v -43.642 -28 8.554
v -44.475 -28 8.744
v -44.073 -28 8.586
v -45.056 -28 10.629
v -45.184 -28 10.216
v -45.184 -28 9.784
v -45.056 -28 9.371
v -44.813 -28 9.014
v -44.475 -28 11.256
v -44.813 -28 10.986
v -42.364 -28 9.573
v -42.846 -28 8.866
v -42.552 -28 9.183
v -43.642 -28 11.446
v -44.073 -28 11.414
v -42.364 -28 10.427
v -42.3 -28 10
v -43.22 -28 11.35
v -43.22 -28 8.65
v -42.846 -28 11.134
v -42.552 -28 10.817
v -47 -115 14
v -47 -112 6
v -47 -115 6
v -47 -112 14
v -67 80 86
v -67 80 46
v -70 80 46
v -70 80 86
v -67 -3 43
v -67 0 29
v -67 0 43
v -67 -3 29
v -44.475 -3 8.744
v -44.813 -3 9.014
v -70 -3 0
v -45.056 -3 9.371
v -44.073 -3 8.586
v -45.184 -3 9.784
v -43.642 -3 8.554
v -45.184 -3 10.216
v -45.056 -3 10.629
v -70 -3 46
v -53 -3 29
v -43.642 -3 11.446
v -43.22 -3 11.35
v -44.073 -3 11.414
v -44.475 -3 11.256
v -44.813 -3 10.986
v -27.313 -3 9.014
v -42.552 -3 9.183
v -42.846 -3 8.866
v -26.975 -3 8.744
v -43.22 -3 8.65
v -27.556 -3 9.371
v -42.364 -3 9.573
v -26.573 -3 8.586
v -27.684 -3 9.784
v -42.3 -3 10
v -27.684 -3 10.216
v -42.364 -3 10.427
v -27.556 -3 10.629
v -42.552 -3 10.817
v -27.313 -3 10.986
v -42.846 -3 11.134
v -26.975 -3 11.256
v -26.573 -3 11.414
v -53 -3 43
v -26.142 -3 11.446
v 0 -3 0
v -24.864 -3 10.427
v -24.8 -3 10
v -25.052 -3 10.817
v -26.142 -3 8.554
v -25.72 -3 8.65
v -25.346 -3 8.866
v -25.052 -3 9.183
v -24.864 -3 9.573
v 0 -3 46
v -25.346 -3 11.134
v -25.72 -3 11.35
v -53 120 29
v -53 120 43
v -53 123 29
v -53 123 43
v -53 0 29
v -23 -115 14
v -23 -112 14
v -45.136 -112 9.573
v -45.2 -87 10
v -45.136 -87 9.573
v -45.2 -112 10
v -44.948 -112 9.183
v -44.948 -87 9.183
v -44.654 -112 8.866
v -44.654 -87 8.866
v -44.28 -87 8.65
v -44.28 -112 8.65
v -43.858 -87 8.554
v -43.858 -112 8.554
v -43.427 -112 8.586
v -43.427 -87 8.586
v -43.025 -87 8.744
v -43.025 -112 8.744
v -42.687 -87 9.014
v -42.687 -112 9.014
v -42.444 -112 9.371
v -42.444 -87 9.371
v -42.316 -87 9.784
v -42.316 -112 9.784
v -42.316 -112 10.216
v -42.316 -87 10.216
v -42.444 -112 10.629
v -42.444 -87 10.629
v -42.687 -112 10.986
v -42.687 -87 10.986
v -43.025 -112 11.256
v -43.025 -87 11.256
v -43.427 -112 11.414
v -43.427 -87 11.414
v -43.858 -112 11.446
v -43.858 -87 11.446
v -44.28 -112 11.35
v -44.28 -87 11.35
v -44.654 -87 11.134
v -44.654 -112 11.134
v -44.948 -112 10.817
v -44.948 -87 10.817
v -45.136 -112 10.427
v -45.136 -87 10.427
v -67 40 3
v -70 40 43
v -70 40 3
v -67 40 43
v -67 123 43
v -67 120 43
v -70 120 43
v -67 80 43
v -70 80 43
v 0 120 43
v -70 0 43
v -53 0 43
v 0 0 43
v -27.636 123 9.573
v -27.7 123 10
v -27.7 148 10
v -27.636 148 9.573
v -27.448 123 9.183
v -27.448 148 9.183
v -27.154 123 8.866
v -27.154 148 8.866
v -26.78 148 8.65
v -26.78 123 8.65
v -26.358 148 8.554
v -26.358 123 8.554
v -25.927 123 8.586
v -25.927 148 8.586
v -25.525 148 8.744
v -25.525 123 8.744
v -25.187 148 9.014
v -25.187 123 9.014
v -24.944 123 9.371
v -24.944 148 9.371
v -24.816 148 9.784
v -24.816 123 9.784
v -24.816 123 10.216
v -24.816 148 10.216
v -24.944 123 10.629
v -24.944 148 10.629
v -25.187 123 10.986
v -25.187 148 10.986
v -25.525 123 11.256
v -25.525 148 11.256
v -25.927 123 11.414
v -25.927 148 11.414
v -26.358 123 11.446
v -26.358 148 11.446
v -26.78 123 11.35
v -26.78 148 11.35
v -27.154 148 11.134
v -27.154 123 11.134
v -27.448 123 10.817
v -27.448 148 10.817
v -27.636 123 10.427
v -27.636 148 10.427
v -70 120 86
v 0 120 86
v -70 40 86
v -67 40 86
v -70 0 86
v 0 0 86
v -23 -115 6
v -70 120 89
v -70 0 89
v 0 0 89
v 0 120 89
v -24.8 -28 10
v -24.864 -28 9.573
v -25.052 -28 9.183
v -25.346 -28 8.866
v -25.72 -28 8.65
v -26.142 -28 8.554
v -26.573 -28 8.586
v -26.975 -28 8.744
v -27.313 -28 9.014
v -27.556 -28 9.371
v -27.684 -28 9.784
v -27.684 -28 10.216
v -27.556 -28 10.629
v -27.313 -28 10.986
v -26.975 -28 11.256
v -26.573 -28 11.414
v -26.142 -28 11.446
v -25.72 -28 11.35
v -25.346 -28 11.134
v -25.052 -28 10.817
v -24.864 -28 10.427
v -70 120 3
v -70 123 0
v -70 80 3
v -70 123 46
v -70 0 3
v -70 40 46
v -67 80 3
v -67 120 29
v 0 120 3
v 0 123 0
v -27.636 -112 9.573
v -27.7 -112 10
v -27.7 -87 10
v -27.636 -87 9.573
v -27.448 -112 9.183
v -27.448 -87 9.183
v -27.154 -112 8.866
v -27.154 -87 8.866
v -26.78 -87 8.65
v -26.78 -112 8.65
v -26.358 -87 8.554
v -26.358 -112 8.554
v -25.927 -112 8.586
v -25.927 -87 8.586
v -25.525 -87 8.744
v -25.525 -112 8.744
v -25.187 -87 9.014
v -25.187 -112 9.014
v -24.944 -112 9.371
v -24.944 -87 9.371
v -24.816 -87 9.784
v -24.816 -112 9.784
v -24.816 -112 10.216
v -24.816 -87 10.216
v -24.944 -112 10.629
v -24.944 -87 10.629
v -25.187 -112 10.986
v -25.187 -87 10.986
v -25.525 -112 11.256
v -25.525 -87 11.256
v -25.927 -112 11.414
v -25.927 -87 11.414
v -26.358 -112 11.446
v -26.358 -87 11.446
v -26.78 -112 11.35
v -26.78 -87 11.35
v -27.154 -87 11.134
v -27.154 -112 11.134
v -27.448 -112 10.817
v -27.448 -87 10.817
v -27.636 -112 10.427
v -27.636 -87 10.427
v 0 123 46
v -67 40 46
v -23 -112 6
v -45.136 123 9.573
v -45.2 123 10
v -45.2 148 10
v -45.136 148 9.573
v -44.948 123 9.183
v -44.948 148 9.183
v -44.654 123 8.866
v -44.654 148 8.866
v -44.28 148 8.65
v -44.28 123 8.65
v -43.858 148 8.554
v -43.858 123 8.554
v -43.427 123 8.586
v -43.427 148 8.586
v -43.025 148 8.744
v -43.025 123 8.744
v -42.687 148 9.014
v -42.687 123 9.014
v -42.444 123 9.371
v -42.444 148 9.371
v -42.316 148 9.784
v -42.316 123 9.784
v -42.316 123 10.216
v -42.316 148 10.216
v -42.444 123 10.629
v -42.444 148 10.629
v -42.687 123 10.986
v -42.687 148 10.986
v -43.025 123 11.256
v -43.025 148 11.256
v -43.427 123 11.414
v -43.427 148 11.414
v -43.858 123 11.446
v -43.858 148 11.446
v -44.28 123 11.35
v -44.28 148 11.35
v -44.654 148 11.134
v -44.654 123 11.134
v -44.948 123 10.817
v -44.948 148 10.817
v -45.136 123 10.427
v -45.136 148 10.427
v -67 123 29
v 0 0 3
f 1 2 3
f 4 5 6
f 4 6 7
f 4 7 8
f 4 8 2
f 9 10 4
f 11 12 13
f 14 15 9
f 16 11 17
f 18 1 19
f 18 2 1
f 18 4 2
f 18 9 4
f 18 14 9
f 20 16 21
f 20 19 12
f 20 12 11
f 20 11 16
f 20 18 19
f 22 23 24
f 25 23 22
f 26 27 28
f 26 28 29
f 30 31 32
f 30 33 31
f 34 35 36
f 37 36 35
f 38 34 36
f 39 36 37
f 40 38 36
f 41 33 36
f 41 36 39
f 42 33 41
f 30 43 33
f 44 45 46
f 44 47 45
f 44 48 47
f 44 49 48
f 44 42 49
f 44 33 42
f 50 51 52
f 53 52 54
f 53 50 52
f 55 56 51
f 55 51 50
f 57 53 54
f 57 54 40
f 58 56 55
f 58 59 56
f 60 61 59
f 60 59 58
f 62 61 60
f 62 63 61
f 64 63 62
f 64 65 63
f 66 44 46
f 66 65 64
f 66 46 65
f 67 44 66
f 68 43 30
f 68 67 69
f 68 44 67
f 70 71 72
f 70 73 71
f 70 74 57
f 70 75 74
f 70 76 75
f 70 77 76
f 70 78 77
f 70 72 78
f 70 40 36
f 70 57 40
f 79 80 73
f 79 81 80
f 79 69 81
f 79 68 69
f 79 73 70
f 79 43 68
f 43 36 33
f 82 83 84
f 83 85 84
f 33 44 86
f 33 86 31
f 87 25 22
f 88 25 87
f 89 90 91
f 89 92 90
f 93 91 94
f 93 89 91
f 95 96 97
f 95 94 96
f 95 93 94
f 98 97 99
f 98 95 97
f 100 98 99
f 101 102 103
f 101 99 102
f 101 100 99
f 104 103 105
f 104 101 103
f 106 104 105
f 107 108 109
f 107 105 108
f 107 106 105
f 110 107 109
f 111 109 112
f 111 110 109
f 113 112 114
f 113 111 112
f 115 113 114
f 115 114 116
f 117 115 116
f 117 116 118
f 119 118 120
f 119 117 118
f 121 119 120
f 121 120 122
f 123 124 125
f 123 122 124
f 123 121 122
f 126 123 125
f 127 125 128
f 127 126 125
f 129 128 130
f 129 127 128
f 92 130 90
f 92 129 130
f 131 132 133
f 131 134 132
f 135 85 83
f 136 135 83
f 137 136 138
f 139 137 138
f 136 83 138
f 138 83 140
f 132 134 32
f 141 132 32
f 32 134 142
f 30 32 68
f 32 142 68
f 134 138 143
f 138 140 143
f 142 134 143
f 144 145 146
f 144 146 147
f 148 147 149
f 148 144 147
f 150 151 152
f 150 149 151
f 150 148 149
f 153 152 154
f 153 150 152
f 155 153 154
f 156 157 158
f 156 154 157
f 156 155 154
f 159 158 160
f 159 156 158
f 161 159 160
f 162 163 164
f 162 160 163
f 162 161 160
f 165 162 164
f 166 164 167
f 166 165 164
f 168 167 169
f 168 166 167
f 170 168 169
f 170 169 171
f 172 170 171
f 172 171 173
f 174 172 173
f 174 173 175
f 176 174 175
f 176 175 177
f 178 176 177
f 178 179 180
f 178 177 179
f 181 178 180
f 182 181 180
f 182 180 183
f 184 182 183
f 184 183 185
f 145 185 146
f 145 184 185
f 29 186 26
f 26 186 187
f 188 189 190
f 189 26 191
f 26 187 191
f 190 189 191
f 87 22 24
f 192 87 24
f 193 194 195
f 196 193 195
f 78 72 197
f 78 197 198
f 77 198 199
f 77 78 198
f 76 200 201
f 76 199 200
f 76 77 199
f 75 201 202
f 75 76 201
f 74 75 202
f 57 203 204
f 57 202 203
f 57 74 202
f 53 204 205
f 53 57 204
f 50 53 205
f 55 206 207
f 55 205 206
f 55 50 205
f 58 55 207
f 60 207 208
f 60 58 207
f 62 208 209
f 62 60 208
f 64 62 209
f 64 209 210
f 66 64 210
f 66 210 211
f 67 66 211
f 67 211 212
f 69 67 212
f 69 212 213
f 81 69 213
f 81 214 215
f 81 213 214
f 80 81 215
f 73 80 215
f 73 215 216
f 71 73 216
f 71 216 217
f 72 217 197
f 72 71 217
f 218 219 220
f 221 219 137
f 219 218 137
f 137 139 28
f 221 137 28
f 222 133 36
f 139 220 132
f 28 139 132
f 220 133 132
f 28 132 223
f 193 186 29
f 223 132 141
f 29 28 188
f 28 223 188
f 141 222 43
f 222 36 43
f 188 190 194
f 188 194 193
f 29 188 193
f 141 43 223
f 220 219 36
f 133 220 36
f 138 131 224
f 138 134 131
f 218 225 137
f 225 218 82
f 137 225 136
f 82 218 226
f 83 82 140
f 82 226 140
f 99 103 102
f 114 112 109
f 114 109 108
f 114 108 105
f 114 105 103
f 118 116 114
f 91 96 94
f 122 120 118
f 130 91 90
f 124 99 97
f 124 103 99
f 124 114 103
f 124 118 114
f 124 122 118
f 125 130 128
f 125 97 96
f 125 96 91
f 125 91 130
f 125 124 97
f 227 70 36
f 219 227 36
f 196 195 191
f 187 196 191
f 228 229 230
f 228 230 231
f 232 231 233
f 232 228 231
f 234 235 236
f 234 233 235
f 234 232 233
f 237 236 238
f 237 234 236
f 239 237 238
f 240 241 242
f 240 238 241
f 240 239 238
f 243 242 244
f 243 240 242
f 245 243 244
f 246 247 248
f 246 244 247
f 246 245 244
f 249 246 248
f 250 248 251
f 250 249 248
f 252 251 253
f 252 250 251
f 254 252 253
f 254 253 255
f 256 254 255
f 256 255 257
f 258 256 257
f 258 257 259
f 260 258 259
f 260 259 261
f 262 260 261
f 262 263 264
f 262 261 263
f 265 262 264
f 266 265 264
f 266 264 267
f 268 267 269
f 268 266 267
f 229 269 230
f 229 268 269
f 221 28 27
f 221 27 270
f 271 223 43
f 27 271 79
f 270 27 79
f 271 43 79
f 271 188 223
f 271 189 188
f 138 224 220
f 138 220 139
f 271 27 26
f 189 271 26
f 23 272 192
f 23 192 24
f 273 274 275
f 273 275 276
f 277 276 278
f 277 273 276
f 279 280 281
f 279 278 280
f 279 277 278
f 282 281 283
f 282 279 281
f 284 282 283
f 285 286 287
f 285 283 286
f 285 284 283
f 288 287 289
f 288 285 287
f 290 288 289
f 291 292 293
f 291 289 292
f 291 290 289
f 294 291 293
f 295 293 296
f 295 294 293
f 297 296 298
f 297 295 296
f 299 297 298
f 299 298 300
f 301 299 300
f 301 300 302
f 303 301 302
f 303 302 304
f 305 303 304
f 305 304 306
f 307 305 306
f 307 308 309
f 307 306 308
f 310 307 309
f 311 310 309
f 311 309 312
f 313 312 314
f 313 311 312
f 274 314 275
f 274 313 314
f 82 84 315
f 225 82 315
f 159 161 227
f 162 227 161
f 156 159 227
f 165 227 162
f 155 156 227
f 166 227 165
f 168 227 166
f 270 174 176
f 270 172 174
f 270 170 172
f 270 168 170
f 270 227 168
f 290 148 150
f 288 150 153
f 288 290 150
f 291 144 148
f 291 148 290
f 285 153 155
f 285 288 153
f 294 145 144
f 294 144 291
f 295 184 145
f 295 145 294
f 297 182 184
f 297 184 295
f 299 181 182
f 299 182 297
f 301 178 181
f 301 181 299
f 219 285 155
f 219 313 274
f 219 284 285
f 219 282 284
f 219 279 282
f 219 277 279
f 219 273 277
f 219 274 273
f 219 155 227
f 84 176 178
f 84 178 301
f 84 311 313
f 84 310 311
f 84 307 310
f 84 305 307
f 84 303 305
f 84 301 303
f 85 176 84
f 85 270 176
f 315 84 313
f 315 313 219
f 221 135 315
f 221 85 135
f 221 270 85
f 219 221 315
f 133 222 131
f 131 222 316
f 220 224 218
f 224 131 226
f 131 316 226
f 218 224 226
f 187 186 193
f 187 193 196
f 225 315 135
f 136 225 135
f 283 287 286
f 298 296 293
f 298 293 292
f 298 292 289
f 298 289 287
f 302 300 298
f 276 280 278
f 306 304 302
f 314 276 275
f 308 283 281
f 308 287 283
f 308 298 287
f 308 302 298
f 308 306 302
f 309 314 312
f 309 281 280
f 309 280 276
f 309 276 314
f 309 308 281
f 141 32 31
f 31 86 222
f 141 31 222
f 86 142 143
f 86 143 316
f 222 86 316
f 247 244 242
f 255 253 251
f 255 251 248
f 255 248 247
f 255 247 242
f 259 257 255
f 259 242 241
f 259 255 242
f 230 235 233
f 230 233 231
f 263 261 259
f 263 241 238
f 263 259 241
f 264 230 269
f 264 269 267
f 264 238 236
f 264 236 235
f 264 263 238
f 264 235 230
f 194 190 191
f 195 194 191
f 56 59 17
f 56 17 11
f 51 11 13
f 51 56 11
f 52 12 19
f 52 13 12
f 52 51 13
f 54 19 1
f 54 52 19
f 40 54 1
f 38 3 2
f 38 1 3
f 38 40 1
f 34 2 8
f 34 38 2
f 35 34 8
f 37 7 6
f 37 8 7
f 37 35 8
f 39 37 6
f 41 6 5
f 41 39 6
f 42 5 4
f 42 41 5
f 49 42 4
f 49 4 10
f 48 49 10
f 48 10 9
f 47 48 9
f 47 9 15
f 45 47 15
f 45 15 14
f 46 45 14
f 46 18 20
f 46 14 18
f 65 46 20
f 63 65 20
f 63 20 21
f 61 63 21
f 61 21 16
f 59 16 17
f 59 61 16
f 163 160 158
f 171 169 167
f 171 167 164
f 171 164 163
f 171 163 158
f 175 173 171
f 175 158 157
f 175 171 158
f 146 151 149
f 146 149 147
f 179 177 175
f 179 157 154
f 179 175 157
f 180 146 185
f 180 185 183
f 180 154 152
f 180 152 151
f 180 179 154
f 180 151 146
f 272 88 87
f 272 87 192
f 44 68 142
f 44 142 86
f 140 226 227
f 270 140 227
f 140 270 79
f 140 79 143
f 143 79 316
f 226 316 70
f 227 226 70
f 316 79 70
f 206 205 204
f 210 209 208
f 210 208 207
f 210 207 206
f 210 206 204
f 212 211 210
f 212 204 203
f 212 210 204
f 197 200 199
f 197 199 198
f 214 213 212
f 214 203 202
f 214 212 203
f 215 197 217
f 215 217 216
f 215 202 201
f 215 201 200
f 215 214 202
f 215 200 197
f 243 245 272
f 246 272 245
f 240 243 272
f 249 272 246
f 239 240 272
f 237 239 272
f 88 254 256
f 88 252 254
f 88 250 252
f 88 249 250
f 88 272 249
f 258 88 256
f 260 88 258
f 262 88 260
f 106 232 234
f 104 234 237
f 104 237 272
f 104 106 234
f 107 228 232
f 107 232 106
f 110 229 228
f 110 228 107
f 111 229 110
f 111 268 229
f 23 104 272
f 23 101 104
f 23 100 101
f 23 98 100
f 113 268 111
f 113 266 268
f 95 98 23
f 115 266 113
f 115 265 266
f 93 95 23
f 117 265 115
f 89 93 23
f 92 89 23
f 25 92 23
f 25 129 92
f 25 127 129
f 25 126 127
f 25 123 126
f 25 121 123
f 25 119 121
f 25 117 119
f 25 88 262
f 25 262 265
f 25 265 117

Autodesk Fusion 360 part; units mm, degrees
sketch "Sketch1" plane through (0, 0, 0) normal (0, 1, 0) x (1, 0, 0) in component "Frame"
  line L0 (0, 0) -> (-70, 0)
  line L1 (-70, 0) -> (-70, -89)
  line L2 (-70, -89) -> (0, -89)
  line L3 (0, -89) -> (0, 0)
  dimension "d1" = 70
  dimension "d2" = 89
extrude "Extrude1" add sketch "Sketch1" along normal blind 120 makes body 1 in component "Frame"
sketch "Sketch2" plane through (0, 0, 0) normal (0, -1, 0) x (1, 0, 0) in component "Frame"
  line L0 (0, 0) -> (0, 89)
  line L1 (0, 89) -> (-70, 89)
  line L2 (-70, 89) -> (-70, 0)
  line L3 (-70, 0) -> (0, 0)
  line L4 (0, 0) -> (-70, 0)
  line L5 (-70, 0) -> (-70, 46)
  line L6 (-70, 46) -> (0, 46)
  line L7 (0, 46) -> (0, 0)
  dimension "d5" = 70
  dimension "d6" = 46
extrude "Extrude2" add sketch "Sketch2" along normal blind 3 contours L0 L2 L3 L4 L5 L6 L7 bodies 1 in component "Frame"
sketch "Sketch3" plane through (0, 120, 0) normal (0, 1, 0) x (-1, 0, 0) in component "Frame"
  line L0 (0, 89) -> (0, 0)
  line L1 (0, 0) -> (70, 0)
  line L2 (70, 0) -> (70, 89)
  line L3 (70, 89) -> (0, 89)
  line L4 (0, 0) -> (70, 0)
  line L5 (70, 0) -> (70, 46)
  line L6 (70, 46) -> (0, 46)
  line L7 (0, 46) -> (0, 0)
  dimension "d9" = 70
  dimension "d10" = 46
extrude "Extrude3" add sketch "Sketch3" along normal blind 3 contours L0 L1 L2 L4 L5 L6 L7 bodies 1 in component "Frame"
sketch "Sketch4" plane through (0, 120, 0) normal (0, 1, 0) x (-1, 0, 0) in component "Frame"
  line L0 (0, 46) -> (70, 46)
  line L1 (70, 46) -> (70, 89)
  line L2 (70, 89) -> (0, 89)
  line L3 (0, 89) -> (0, 46)
  line L4 (0, 46) -> (67, 46)
  line L5 (67, 46) -> (67, 86)
  line L6 (67, 86) -> (0, 86)
  line L7 (0, 86) -> (0, 46)
  dimension "d13" = 67
  dimension "d14" = 40
extrude "Extrude4" cut sketch "Sketch4" against normal up to surface (120 mm away) contours L0 L3 L4 L5 L6 L7 bodies 1 in component "Frame"
sketch "Sketch5" plane through (0, 0, 0) normal (1, 0, 0) x (0, 1, 0) in component "Frame"
  line L0 (123, 46) -> (-3, 46)
  line L1 (-3, 46) -> (-3, 0)
  line L2 (-3, 0) -> (123, 0)
  line L3 (123, 0) -> (123, 46)
  line L4 (120, 3) -> (0, 3)
  line L5 (0, 3) -> (0, 43)
  line L6 (0, 43) -> (120, 43)
  line L7 (120, 43) -> (120, 3)
  dimension "d17" = 120
extrude "Extrude5" cut sketch "Sketch5" against normal blind 67 contours L4 L5 L6 L7 bodies 1 in component "Frame"
sketch "Sketch6" plane through (-67, 0, 0) normal (1, 0, 0) x (0, 1, 0) in component "Frame"
  line L0 (120, 43) -> (0, 43)
  line L1 (0, 43) -> (0, 3)
  line L2 (0, 3) -> (120, 3)
  line L3 (120, 3) -> (120, 43)
  line L4 (0, 43) -> (40, 43)
  line L5 (40, 43) -> (40, 3)
  line L6 (40, 3) -> (0, 3)
  line L7 (0, 3) -> (0, 43)
  dimension "d20" = 40
  dimension "d21" = 40
extrude "Extrude6" cut sketch "Sketch6" against normal blind 3 contours L0 L1 L2 L4 L5 L6 L7 bodies 1 in component "Frame"
sketch "Sketch7" plane through (-67, 0, 0) normal (1, 0, 0) x (0, 1, 0) in component "Frame"
  line L0 (40, 43) -> (40, 3)
  line L1 (40, 3) -> (120, 3)
  line L2 (120, 3) -> (120, 43)
  line L3 (120, 43) -> (40, 43)
  line L4 (120, 3) -> (80, 3)
  line L5 (80, 3) -> (80, 43)
  line L6 (80, 43) -> (120, 43)
  line L7 (120, 43) -> (120, 3)
  dimension "d24" = 40
  dimension "d25" = 40
extrude "Extrude7" cut sketch "Sketch7" against normal blind 3 contours L1 L2 L3 L4 L5 L6 L7 bodies 1 in component "Frame"
sketch "Sketch8" plane through (-67, 0, 0) normal (1, 0, 0) x (0, 1, 0) in component "Frame"
  line L0 (0, 86) -> (0, 46)
  line L1 (0, 46) -> (120, 46)
  line L2 (120, 46) -> (120, 86)
  line L3 (120, 86) -> (0, 86)
  line L4 (0, 86) -> (40, 86)
  line L5 (40, 86) -> (40, 46)
  line L6 (40, 46) -> (0, 46)
  line L7 (0, 46) -> (0, 86)
  dimension "d28" = 40
  dimension "d29" = 40
extrude "Extrude8" cut sketch "Sketch8" against normal blind 3 contours L0 L1 L3 L4 L5 L6 L7 bodies 1 in component "Frame"
sketch "Sketch9" plane through (-67, 0, 0) normal (1, 0, 0) x (0, 1, 0) in component "Frame"
  line L0 (40, 86) -> (40, 46)
  line L1 (40, 46) -> (120, 46)
  line L2 (120, 46) -> (120, 86)
  line L3 (120, 86) -> (40, 86)
  line L4 (120, 46) -> (80, 46)
  line L5 (80, 46) -> (80, 86)
  line L6 (80, 86) -> (120, 86)
  line L7 (120, 86) -> (120, 46)
  dimension "d32" = 40
  dimension "d33" = 40
extrude "Extrude9" cut sketch "Sketch9" against normal blind 3 contours L1 L2 L3 L4 L5 L6 L7 bodies 1 in component "Frame"
sketch "Sketch10" plane through (0, -3, 0) normal (0, -1, 0) x (1, 0, 0) in component "Frame"
  line L0 (0, 46) -> (-70, 46)
  line L1 (-70, 46) -> (-70, 0)
  line L2 (-70, 0) -> (0, 0)
  line L3 (0, 0) -> (0, 46)
  line L4 (0, 0) -> (-26.25, 0) construction
  line L5 (-26.25, 0) -> (-26.25, 10) construction
  line L6 (-26.25, 10) -> (-43.75, 10) construction
  line L7 (-43.75, 10) -> (-43.75, 0) construction
  line L8 (-43.75, 0) -> (-70, 0) construction
  circle A0 centre (-43.75, 10) radius 1.45
  circle A1 centre (-26.25, 10) radius 1.45
  dimension "d36" = 26.25
  dimension "d37" = 10
  dimension "d38" = 17.5
  dimension "d39" = 2.9
  dimension "d40" = 2.9
extrude "Extrude10" add sketch "Sketch10" along normal blind 25 contours A0 | A1 bodies 1 in component "Frame"
sketch "Sketch11" plane through (0, -3, 0) normal (0, -1, 0) x (1, 0, 0) in component "Frame"
  circle A0 centre (-26.25, 10) radius 1.45
  circle A1 centre (-43.75, 10) radius 1.45
  line L0 (0, 46) -> (-70, 46)
  line L1 (-70, 46) -> (-70, 0)
  line L2 (-70, 0) -> (0, 0)
  line L3 (0, 0) -> (0, 46)
  line L4 (-70, 46) -> (-67, 46) construction
  line L5 (-67, 46) -> (-67, 43) construction
  line L6 (-67, 43) -> (-53, 43)
  line L7 (-53, 43) -> (-53, 29)
  line L8 (-53, 29) -> (-67, 29)
  line L9 (-67, 29) -> (-67, 43)
  dimension "d43" = 3
extrude "Extrude11" cut sketch "Sketch11" against normal blind 3 contours L6 L7 L8 L9 bodies 1 in component "Frame"
sketch "Sketch12" plane through (0, 123, 0) normal (0, 1, 0) x (-1, 0, 0) in component "Frame"
  line L0 (0, 46) -> (0, 0)
  line L1 (0, 0) -> (70, 0)
  line L2 (70, 0) -> (70, 46)
  line L3 (70, 46) -> (0, 46)
  line L4 (70, 46) -> (67, 46) construction
  line L5 (67, 46) -> (67, 43) construction
  line L6 (67, 43) -> (53, 43)
  line L7 (53, 43) -> (53, 29)
  line L8 (53, 29) -> (67, 29)
  line L9 (67, 29) -> (67, 43)
  dimension "d46" = 3
  dimension "d47" = 14
  dimension "d48" = 14
extrude "Extrude12" cut sketch "Sketch12" against normal blind 3 contours L6 L7 L8 L9 bodies 1 in component "Frame"
sketch "Sketch13" plane through (0, 123, 0) normal (0, 1, 0) x (-1, 0, 0) in component "Frame"
  line L0 (53, 43) -> (67, 43)
  line L1 (67, 43) -> (67, 29)
  line L2 (67, 29) -> (53, 29)
  line L3 (53, 29) -> (53, 43)
  line L4 (0, 46) -> (0, 0)
  line L5 (0, 0) -> (70, 0)
  line L6 (70, 0) -> (70, 46)
  line L7 (70, 46) -> (0, 46)
  line L8 (70, 0) -> (43.75, 0) construction
  line L9 (43.75, 0) -> (43.75, 10) construction
  line L10 (43.75, 10) -> (26.25, 10) construction
  line L11 (26.25, 10) -> (26.25, 0) construction
  line L12 (0, 0) -> (26.25, 0) construction
  circle A0 centre (26.25, 10) radius 1.45
  circle A1 centre (43.75, 10) radius 1.45
  dimension "d51" = 26.25
  dimension "d52" = 10
  dimension "d53" = 17.5
  dimension "d54" = 2.9
  dimension "d55" = 2.9
extrude "Extrude13" add sketch "Sketch13" along normal blind 25 contours A0 | A1 bodies 1 in component "Frame"
sketch "Sketch1 (2)" plane through (0, 0, 0) normal (0, 1, 0) x (1, 0, 0) in component "Frame partial"
  line L0 (0, 0) -> (-70, 0)
  line L1 (-70, 0) -> (-70, -89)
  line L2 (-70, -89) -> (0, -89)
  line L3 (0, -89) -> (0, 0)
  dimension "d1_1" = 70
  dimension "d2_1" = 89
extrude "Extrude1'" add sketch "Sketch1 (2)" along normal blind 120 separate body makes body 2 in component "Frame partial"
sketch "Sketch2 (2)" plane through (0, 0, 0) normal (0, -1, 0) x (1, 0, 0) in component "Frame partial"
  line L0 (0, 0) -> (0, 89)
  line L1 (0, 89) -> (-70, 89)
  line L2 (-70, 89) -> (-70, 0)
  line L3 (-70, 0) -> (0, 0)
  line L4 (0, 0) -> (-70, 0)
  line L5 (-70, 0) -> (-70, 46)
  line L6 (-70, 46) -> (0, 46)
  line L7 (0, 46) -> (0, 0)
  dimension "d5_1" = 70
  dimension "d6_1" = 46
extrude "Extrude2'" add sketch "Sketch2 (2)" along normal blind 3 contours L0 L2 L3 L4 L5 L6 L7 bodies 2 in component "Frame partial"
sketch "Sketch3 (2)" plane through (0, 120, 0) normal (0, 1, 0) x (-1, 0, 0) in component "Frame partial"
  line L0 (0, 89) -> (0, 0)
  line L1 (0, 0) -> (70, 0)
  line L2 (70, 0) -> (70, 89)
  line L3 (70, 89) -> (0, 89)
  line L4 (0, 0) -> (70, 0)
  line L5 (70, 0) -> (70, 46)
  line L6 (70, 46) -> (0, 46)
  line L7 (0, 46) -> (0, 0)
  dimension "d9_1" = 70
  dimension "d10_1" = 46
extrude "Extrude3'" add sketch "Sketch3 (2)" along normal blind 3 contours L0 L1 L2 L4 L5 L6 L7 bodies 2 in component "Frame partial"
sketch "Sketch4 (2)" plane through (0, 120, 0) normal (0, 1, 0) x (-1, 0, 0) in component "Frame partial"
  line L0 (0, 46) -> (70, 46)
  line L1 (70, 46) -> (70, 89)
  line L2 (70, 89) -> (0, 89)
  line L3 (0, 89) -> (0, 46)
  line L4 (0, 46) -> (67, 46)
  line L5 (67, 46) -> (67, 86)
  line L6 (67, 86) -> (0, 86)
  line L7 (0, 86) -> (0, 46)
  dimension "d13_1" = 67
  dimension "d14_1" = 40
extrude "Extrude4'" cut sketch "Sketch4 (2)" against normal up to surface (120 mm away) contours L0 L3 L4 L5 L6 L7 bodies 2 in component "Frame partial"
sketch "Sketch5 (2)" plane through (0, 0, 0) normal (1, 0, 0) x (0, 1, 0) in component "Frame partial"
  line L0 (123, 46) -> (-3, 46)
  line L1 (-3, 46) -> (-3, 0)
  line L2 (-3, 0) -> (123, 0)
  line L3 (123, 0) -> (123, 46)
  line L4 (120, 3) -> (0, 3)
  line L5 (0, 3) -> (0, 43)
  line L6 (0, 43) -> (120, 43)
  line L7 (120, 43) -> (120, 3)
  dimension "d17_1" = 120
extrude "Extrude5'" cut sketch "Sketch5 (2)" against normal blind 67 contours L4 L5 L6 L7 bodies 2 in component "Frame partial"
sketch "Sketch6 (2)" plane through (-67, 0, 0) normal (1, 0, 0) x (0, 1, 0) in component "Frame partial"
  line L0 (120, 43) -> (0, 43)
  line L1 (0, 43) -> (0, 3)
  line L2 (0, 3) -> (120, 3)
  line L3 (120, 3) -> (120, 43)
  line L4 (0, 43) -> (40, 43)
  line L5 (40, 43) -> (40, 3)
  line L6 (40, 3) -> (0, 3)
  line L7 (0, 3) -> (0, 43)
  dimension "d20_1" = 40
  dimension "d21_1" = 40
extrude "Extrude6'" cut sketch "Sketch6 (2)" against normal blind 3 contours L0 L1 L2 L4 L5 L6 L7 bodies 2 in component "Frame partial"
sketch "Sketch7 (2)" plane through (-67, 0, 0) normal (1, 0, 0) x (0, 1, 0) in component "Frame partial"
  line L0 (40, 43) -> (40, 3)
  line L1 (40, 3) -> (120, 3)
  line L2 (120, 3) -> (120, 43)
  line L3 (120, 43) -> (40, 43)
  line L4 (120, 3) -> (80, 3)
  line L5 (80, 3) -> (80, 43)
  line L6 (80, 43) -> (120, 43)
  line L7 (120, 43) -> (120, 3)
  dimension "d24_1" = 40
  dimension "d25_1" = 40
extrude "Extrude7'" cut sketch "Sketch7 (2)" against normal blind 3 contours L1 L2 L3 L4 L5 L6 L7 bodies 2 in component "Frame partial"
sketch "Sketch8 (2)" plane through (-67, 0, 0) normal (1, 0, 0) x (0, 1, 0) in component "Frame partial"
  line L0 (0, 86) -> (0, 46)
  line L1 (0, 46) -> (120, 46)
  line L2 (120, 46) -> (120, 86)
  line L3 (120, 86) -> (0, 86)
  line L4 (0, 86) -> (40, 86)
  line L5 (40, 86) -> (40, 46)
  line L6 (40, 46) -> (0, 46)
  line L7 (0, 46) -> (0, 86)
  dimension "d28_1" = 40
  dimension "d29_1" = 40
extrude "Extrude8'" cut sketch "Sketch8 (2)" against normal blind 3 contours L0 L1 L3 L4 L5 L6 L7 bodies 2 in component "Frame partial"
sketch "Sketch9 (2)" plane through (-67, 0, 0) normal (1, 0, 0) x (0, 1, 0) in component "Frame partial"
  line L0 (40, 86) -> (40, 46)
  line L1 (40, 46) -> (120, 46)
  line L2 (120, 46) -> (120, 86)
  line L3 (120, 86) -> (40, 86)
  line L4 (120, 46) -> (80, 46)
  line L5 (80, 46) -> (80, 86)
  line L6 (80, 86) -> (120, 86)
  line L7 (120, 86) -> (120, 46)
  dimension "d32_1" = 40
  dimension "d33_1" = 40
extrude "Extrude9'" cut sketch "Sketch9 (2)" against normal blind 3 contours L1 L2 L3 L4 L5 L6 L7 bodies 2 in component "Frame partial"
sketch "Sketch10 (2)" plane through (0, -3, 0) normal (0, -1, 0) x (1, 0, 0) in component "Frame partial"
  line L0 (0, 46) -> (-70, 46)
  line L1 (-70, 46) -> (-70, 0)
  line L2 (-70, 0) -> (0, 0)
  line L3 (0, 0) -> (0, 46)
  line L4 (0, 0) -> (-26.25, 0) construction
  line L5 (-26.25, 0) -> (-26.25, 10) construction
  line L6 (-26.25, 10) -> (-43.75, 10) construction
  line L7 (-43.75, 10) -> (-43.75, 0) construction
  line L8 (-43.75, 0) -> (-70, 0) construction
  circle A0 centre (-43.75, 10) radius 1.45
  circle A1 centre (-26.25, 10) radius 1.45
  dimension "d36_1" = 26.25
  dimension "d37_1" = 10
  dimension "d38_1" = 17.5
  dimension "d39_1" = 2.9
  dimension "d40_1" = 2.9
extrude "Extrude10'" add sketch "Sketch10 (2)" along normal blind 25 contours A0 | A1 bodies 2 in component "Frame partial"
sketch "Sketch11 (2)" plane through (0, -3, 0) normal (0, -1, 0) x (1, 0, 0) in component "Frame partial"
  circle A0 centre (-26.25, 10) radius 1.45
  circle A1 centre (-43.75, 10) radius 1.45
  line L0 (0, 46) -> (-70, 46)
  line L1 (-70, 46) -> (-70, 0)
  line L2 (-70, 0) -> (0, 0)
  line L3 (0, 0) -> (0, 46)
  line L4 (-70, 46) -> (-67, 46) construction
  line L5 (-67, 46) -> (-67, 43) construction
  line L6 (-67, 43) -> (-53, 43)
  line L7 (-53, 43) -> (-53, 29)
  line L8 (-53, 29) -> (-67, 29)
  line L9 (-67, 29) -> (-67, 43)
  dimension "d43_1" = 3
extrude "Extrude11'" cut sketch "Sketch11 (2)" against normal blind 3 contours L6 L7 L8 L9 bodies 2 in component "Frame partial"
sketch "Sketch12 (2)" plane through (0, 123, 0) normal (0, 1, 0) x (-1, 0, 0) in component "Frame partial"
  line L0 (0, 46) -> (0, 0)
  line L1 (0, 0) -> (70, 0)
  line L2 (70, 0) -> (70, 46)
  line L3 (70, 46) -> (0, 46)
  line L4 (70, 46) -> (67, 46) construction
  line L5 (67, 46) -> (67, 43) construction
  line L6 (67, 43) -> (53, 43)
  line L7 (53, 43) -> (53, 29)
  line L8 (53, 29) -> (67, 29)
  line L9 (67, 29) -> (67, 43)
  dimension "d46_1" = 3
  dimension "d47_1" = 14
  dimension "d48_1" = 14
extrude "Extrude12'" cut sketch "Sketch12 (2)" against normal blind 3 contours L6 L7 L8 L9 bodies 2 in component "Frame partial"
sketch "Sketch13 (2)" plane through (0, 123, 0) normal (0, 1, 0) x (-1, 0, 0) in component "Frame partial"
  line L0 (53, 43) -> (67, 43)
  line L1 (67, 43) -> (67, 29)
  line L2 (67, 29) -> (53, 29)
  line L3 (53, 29) -> (53, 43)
  line L4 (0, 46) -> (0, 0)
  line L5 (0, 0) -> (70, 0)
  line L6 (70, 0) -> (70, 46)
  line L7 (70, 46) -> (0, 46)
  line L8 (70, 0) -> (43.75, 0) construction
  line L9 (43.75, 0) -> (43.75, 10) construction
  line L10 (43.75, 10) -> (26.25, 10) construction
  line L11 (26.25, 10) -> (26.25, 0) construction
  line L12 (0, 0) -> (26.25, 0) construction
  circle A0 centre (26.25, 10) radius 1.45
  circle A1 centre (43.75, 10) radius 1.45
  dimension "d51_1" = 26.25
  dimension "d52_1" = 10
  dimension "d53_1" = 17.5
  dimension "d54_1" = 2.9
  dimension "d55_1" = 2.9
extrude "Extrude13'" add sketch "Sketch13 (2)" along normal blind 25 contours A0 | A1 bodies 2 in component "Frame partial"
sketch "Sketch14" plane through (-70, 0, 0) normal (-1, 0, 0) x (0, -1, 0) in component "Frame"
  line L0 (155, 46) -> (112, 46)
  line L1 (112, 46) -> (112, 0)
  line L2 (112, 0) -> (238, 0)
  line L3 (238, 0) -> (238, 46)
  line L4 (238, 46) -> (195, 46)
  line L5 (195, 46) -> (195, 86)
  line L6 (195, 86) -> (235, 86)
  line L7 (235, 86) -> (235, 89)
  line L8 (235, 89) -> (115, 89)
  line L9 (115, 89) -> (115, 86)
  line L10 (115, 86) -> (155, 86)
  line L11 (155, 86) -> (155, 46)
  line L12 (155, 43) -> (155, 3)
  line L13 (155, 3) -> (115, 3)
  line L14 (115, 3) -> (115, 43)
  line L15 (115, 43) -> (155, 43)
  line L16 (195, 3) -> (195, 43)
  line L17 (195, 43) -> (235, 43)
  line L18 (235, 43) -> (235, 3)
  line L19 (235, 3) -> (195, 3)
  line L20 (115, 0) -> (271.3047, 0)
  line L21 (271.3047, 0) -> (271.3047, 99.153)
  line L22 (271.3047, 99.153) -> (115, 99.153)
  line L23 (115, 99.153) -> (115, 0)
extrude "Extrude14" cut sketch "Sketch14" against normal blind 70 contours L0 L2 L3 L4 L5 L6 L7 L8 L9 L10 L11 L12 L13 L15 L20 L23 | L0 L10 L11 L23 | L12 L13 L14 L15 L23 | L3 L4 L5 L6 L7 L8 L20 L21 L22 L23 | L16 L17 L18 L19 sketch seen with x (1, 0, 0) y (0, 1, 0) z (0, 0, 1) at (0, 235, 0) bodies 2 in component "Frame partial"
sketch "Sketch14 (2)" plane through (0, 123, 0) normal (0, 1, 0) x (-1, 0, 0) in component "Frame partial"
  circle A0 centre (43.75, 10) radius 1.45
  circle A1 centre (26.25, 10) radius 1.45
  line L0 (53, 43) -> (67, 43)
  line L1 (67, 43) -> (67, 29)
  line L2 (67, 29) -> (53, 29)
  line L3 (53, 29) -> (53, 43)
  line L4 (0, 46) -> (0, 0)
  line L5 (0, 0) -> (70, 0)
  line L6 (70, 0) -> (70, 46)
  line L7 (70, 46) -> (0, 46)
  line L8 (23, 6) -> (47, 6)
  line L9 (47, 6) -> (47, 14)
  line L10 (47, 14) -> (23, 14)
  line L11 (23, 14) -> (23, 6)
extrude "Extrude15" cut sketch "Sketch14 (2)" against normal blind 3 contours L4 L5 L6 L7 bodies 2 in component "Frame partial"
component "Frame" placed x (1, 0, 0) y (0, 1, 0) z (0, 0, 1) at (0, 0, 0)
component "Frame partial" placed x (1, 0, 0) y (0, 1, 0) z (0, 0, 1) at (0, -235, 0)
